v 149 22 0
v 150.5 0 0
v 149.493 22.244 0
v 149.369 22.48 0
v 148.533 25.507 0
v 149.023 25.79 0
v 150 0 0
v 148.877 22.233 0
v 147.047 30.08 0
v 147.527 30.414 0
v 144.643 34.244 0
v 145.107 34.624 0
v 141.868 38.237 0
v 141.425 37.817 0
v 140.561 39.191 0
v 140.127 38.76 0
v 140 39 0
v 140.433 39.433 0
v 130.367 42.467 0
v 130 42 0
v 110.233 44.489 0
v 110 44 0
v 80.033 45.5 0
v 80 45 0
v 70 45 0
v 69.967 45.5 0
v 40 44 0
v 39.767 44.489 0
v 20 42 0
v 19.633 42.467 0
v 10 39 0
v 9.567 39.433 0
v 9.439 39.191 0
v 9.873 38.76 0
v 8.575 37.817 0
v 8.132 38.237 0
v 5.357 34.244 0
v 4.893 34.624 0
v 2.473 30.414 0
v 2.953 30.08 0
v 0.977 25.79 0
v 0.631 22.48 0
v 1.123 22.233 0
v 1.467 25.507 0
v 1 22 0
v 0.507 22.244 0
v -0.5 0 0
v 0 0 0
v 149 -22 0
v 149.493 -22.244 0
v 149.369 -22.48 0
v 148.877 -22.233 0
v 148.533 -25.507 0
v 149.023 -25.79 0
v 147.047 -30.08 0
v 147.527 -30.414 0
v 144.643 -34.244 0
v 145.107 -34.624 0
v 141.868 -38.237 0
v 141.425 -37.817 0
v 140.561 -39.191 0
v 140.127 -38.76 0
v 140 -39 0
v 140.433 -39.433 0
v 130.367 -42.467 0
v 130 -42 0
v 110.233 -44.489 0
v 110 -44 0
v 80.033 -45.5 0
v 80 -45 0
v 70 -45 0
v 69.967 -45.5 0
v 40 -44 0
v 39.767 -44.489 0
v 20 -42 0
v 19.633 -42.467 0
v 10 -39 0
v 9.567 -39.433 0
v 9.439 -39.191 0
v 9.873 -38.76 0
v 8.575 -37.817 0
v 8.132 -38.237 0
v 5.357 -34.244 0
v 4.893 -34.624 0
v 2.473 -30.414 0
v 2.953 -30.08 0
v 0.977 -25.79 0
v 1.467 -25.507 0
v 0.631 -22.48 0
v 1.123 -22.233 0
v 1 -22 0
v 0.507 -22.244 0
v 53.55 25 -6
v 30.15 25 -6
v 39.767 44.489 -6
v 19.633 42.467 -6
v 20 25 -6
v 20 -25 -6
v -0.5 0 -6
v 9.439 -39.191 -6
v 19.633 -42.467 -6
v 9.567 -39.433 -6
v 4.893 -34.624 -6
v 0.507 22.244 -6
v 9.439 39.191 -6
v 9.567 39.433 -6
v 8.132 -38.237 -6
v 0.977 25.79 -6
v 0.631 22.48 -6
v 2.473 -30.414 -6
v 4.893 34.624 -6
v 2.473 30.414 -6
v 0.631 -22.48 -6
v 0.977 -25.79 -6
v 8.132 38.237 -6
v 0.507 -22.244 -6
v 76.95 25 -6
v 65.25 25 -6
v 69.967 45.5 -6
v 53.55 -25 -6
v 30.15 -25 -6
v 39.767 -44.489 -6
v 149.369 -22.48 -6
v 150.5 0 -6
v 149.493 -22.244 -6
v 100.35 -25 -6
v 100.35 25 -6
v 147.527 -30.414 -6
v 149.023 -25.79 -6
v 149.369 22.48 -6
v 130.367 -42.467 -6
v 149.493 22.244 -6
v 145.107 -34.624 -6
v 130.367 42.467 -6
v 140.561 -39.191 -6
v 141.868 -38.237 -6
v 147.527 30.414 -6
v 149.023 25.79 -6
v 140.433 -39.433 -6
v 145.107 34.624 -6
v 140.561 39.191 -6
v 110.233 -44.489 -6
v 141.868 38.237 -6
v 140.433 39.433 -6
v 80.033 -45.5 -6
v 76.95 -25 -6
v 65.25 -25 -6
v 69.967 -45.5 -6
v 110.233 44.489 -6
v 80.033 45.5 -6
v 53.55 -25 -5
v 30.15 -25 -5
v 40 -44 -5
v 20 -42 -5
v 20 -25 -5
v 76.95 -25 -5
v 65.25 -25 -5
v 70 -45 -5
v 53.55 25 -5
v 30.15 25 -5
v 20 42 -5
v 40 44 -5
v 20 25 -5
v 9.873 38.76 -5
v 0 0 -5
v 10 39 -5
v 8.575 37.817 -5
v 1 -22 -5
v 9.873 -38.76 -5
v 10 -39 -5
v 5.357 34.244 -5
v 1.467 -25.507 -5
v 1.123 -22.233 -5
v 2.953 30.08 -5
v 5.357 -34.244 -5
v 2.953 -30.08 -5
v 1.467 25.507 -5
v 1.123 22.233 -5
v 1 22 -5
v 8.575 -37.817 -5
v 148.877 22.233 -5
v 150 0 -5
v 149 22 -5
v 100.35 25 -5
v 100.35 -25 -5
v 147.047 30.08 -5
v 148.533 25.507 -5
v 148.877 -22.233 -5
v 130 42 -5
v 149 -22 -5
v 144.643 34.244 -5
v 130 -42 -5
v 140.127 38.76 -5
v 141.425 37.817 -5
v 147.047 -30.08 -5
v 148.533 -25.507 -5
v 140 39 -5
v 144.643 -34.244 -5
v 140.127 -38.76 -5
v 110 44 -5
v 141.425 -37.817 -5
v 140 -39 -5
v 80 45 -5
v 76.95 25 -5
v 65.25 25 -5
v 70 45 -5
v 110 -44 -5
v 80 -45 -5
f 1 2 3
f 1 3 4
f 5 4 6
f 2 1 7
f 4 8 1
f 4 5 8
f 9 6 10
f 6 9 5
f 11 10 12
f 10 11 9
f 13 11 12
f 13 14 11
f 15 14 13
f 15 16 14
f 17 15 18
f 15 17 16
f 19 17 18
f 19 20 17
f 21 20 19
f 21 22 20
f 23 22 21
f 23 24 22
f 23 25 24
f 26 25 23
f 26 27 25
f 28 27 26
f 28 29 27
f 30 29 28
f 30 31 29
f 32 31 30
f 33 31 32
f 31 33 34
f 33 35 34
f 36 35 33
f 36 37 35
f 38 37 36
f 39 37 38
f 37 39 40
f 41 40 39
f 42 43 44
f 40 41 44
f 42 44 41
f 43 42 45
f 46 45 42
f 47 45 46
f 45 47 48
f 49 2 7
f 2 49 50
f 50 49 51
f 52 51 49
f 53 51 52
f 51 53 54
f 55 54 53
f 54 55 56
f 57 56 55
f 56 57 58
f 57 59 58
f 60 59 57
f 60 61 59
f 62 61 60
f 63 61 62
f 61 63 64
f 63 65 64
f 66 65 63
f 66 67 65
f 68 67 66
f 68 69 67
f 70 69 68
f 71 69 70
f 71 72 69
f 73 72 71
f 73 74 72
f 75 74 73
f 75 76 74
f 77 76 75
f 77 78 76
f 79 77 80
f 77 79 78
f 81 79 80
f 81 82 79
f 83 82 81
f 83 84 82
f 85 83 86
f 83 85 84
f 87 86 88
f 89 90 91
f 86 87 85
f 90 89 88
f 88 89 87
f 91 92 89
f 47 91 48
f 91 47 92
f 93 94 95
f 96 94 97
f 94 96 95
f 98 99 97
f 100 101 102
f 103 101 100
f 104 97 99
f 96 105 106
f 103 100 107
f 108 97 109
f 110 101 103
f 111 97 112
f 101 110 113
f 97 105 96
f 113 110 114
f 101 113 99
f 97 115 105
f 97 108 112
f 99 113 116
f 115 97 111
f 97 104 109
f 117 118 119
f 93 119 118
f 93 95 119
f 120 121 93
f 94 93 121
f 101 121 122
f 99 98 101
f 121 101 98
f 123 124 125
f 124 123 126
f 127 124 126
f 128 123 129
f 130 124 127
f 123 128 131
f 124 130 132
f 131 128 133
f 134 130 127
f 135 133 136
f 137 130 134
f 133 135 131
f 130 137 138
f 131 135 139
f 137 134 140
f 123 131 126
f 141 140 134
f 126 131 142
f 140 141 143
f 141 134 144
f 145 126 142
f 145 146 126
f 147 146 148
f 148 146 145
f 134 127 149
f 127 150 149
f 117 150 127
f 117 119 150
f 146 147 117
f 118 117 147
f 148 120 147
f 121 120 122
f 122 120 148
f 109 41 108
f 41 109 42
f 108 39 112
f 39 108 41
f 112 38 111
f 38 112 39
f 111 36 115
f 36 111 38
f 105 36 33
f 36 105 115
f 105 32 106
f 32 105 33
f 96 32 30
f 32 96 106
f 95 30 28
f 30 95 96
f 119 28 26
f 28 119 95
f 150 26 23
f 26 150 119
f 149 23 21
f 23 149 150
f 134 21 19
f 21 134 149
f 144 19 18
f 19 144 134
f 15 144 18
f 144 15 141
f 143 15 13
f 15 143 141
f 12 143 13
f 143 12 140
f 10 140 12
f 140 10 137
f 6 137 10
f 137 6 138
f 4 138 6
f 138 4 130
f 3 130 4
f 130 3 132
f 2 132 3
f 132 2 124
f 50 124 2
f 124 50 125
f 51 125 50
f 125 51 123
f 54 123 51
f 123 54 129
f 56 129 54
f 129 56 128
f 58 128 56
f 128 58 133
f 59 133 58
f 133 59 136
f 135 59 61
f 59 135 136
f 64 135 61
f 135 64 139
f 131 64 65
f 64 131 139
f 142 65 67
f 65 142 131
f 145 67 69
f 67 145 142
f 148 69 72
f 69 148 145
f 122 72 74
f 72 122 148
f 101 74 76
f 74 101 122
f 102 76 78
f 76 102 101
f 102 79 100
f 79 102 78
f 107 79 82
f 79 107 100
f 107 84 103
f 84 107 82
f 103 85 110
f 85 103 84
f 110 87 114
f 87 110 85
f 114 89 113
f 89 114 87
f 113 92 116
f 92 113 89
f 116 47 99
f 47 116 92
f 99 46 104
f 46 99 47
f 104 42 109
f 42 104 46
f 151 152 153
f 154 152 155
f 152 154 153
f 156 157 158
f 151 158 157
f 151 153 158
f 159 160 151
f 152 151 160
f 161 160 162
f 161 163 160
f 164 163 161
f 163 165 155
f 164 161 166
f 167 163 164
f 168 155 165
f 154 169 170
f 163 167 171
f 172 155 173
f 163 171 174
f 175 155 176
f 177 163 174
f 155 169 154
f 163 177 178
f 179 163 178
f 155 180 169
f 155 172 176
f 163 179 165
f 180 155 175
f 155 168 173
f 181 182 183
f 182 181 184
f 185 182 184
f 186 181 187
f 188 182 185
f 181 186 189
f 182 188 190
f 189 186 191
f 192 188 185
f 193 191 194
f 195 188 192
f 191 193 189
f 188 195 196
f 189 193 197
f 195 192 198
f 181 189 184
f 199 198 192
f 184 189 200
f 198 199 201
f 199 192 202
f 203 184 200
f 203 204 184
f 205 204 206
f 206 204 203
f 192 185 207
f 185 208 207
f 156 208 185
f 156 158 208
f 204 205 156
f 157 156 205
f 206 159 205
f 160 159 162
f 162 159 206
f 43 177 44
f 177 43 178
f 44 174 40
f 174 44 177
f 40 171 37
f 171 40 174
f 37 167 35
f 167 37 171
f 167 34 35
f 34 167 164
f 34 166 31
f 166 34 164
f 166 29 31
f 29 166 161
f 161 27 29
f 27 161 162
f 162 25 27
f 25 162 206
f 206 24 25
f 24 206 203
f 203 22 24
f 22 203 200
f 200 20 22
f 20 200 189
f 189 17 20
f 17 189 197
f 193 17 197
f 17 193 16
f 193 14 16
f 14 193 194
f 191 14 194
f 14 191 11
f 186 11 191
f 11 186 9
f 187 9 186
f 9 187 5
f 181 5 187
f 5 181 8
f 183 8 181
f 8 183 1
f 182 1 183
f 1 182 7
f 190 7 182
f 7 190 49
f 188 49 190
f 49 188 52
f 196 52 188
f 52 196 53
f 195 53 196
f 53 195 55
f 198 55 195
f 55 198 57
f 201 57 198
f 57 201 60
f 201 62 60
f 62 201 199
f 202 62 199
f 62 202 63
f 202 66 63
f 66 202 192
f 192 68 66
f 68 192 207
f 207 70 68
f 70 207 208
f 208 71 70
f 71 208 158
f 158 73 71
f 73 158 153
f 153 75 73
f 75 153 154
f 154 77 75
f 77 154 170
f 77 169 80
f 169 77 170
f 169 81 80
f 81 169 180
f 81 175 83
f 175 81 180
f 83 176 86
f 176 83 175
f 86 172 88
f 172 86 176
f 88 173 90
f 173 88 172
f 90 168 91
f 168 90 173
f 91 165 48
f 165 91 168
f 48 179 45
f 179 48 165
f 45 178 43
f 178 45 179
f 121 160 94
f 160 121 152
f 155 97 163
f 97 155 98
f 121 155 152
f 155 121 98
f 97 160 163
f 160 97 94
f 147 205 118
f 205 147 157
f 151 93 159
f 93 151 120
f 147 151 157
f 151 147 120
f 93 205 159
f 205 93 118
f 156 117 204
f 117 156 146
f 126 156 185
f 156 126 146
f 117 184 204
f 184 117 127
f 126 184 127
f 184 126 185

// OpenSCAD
// Cover for the display panel on a Schwinn IC4 / Bowflex C6 stationary bike

lip_height = 5;  // how tall to make the lip that hangs down
thickness = 1;  // how thick to make the walls
rpm_slot = true;
time_slot = false;
calorie_slot = false;
speed_slot = true;
distance_slot = false;
level_slot = true;
pulse_slot = true;

module half_display_polygon() {
    polygon([
        [  0,  0],
        [  1, 22],
        [ 10, 39],
        [ 20, 42],
        [ 30, 43],
        [ 40, 44],
        [ 70, 45],
        [ 80, 45],
        [110, 44],
        [120, 43],
        [130, 42],
        [140, 39],
        [149, 22],
        [150,  0],
    ]);
};

module rounded_wedge(pt1, pt2, r) {
    // Find the circle with the specified radius between the two points
    // and save only the wedge of it between the two points
    // (if it points the wrong way, simply swap the two points)
    pta = 0.5 * (pt2 - pt1);
    a = norm(pta);
    b = sqrt(r^2 - a^2);
    median = 0.5 * (pt1 + pt2);
    center = [
        median.x + b * pta.y / a,
        median.y - b * pta.x / a,
    ];
    intersection() {
        translate(center) circle(r);
        polygon([
            center,
            2 * pt1 - center,
            2 * pt2 - center,
        ]);
    }
};

module half_display_rounded() {
    r = 23;
    union() {
        half_display_polygon();
        rounded_wedge([1, 22], [10, 39], r);
        rounded_wedge([140, 39], [149, 22], r);
    };
}
        

module display() {
    union() {
        half_display_rounded();
        mirror([0, 1, 0]) half_display_rounded();
    }
};

module display_cover() {
    difference() {
        translate([-thickness/2, 0, 0]) linear_extrude(lip_height + thickness) scale([(150 + thickness)/150, (90 + thickness)/90, 1]) display();
        linear_extrude(lip_height) display();
    };
};

module display_slots() {
    offset = 20;
    w = 50;
    translate([offset, 0, lip_height]) union() {
        if (rpm_slot) {
            translate([5.075, 0, 0]) cube([10.15, w, 2*thickness], center=true);
        };
        if (time_slot) {
            translate([16.0, 0, 0]) cube([11.7, w, 2*thickness], center=true);
        };
        if (calorie_slot) {
            translate([27.7, 0, 0]) cube([11.7, w, 2*thickness], center=true);
        };
        if (speed_slot) {
            translate([39.4, 0, 0]) cube([11.7, w, 2*thickness], center=true);
        };
        if (distance_slot) {
            translate([51.1, 0, 0]) cube([11.7, w, 2*thickness], center=true);
        };
        if (level_slot) {
            translate([62.8, 0, 0]) cube([11.7, w, 2*thickness], center=true);
        };
        if (pulse_slot) {
            translate([74.5, 0, 0]) cube([11.7, w, 2*thickness], center=true);
        };
    };
}


rotate([180, 0, 0]) difference() {
    display_cover();
    display_slots();
}
